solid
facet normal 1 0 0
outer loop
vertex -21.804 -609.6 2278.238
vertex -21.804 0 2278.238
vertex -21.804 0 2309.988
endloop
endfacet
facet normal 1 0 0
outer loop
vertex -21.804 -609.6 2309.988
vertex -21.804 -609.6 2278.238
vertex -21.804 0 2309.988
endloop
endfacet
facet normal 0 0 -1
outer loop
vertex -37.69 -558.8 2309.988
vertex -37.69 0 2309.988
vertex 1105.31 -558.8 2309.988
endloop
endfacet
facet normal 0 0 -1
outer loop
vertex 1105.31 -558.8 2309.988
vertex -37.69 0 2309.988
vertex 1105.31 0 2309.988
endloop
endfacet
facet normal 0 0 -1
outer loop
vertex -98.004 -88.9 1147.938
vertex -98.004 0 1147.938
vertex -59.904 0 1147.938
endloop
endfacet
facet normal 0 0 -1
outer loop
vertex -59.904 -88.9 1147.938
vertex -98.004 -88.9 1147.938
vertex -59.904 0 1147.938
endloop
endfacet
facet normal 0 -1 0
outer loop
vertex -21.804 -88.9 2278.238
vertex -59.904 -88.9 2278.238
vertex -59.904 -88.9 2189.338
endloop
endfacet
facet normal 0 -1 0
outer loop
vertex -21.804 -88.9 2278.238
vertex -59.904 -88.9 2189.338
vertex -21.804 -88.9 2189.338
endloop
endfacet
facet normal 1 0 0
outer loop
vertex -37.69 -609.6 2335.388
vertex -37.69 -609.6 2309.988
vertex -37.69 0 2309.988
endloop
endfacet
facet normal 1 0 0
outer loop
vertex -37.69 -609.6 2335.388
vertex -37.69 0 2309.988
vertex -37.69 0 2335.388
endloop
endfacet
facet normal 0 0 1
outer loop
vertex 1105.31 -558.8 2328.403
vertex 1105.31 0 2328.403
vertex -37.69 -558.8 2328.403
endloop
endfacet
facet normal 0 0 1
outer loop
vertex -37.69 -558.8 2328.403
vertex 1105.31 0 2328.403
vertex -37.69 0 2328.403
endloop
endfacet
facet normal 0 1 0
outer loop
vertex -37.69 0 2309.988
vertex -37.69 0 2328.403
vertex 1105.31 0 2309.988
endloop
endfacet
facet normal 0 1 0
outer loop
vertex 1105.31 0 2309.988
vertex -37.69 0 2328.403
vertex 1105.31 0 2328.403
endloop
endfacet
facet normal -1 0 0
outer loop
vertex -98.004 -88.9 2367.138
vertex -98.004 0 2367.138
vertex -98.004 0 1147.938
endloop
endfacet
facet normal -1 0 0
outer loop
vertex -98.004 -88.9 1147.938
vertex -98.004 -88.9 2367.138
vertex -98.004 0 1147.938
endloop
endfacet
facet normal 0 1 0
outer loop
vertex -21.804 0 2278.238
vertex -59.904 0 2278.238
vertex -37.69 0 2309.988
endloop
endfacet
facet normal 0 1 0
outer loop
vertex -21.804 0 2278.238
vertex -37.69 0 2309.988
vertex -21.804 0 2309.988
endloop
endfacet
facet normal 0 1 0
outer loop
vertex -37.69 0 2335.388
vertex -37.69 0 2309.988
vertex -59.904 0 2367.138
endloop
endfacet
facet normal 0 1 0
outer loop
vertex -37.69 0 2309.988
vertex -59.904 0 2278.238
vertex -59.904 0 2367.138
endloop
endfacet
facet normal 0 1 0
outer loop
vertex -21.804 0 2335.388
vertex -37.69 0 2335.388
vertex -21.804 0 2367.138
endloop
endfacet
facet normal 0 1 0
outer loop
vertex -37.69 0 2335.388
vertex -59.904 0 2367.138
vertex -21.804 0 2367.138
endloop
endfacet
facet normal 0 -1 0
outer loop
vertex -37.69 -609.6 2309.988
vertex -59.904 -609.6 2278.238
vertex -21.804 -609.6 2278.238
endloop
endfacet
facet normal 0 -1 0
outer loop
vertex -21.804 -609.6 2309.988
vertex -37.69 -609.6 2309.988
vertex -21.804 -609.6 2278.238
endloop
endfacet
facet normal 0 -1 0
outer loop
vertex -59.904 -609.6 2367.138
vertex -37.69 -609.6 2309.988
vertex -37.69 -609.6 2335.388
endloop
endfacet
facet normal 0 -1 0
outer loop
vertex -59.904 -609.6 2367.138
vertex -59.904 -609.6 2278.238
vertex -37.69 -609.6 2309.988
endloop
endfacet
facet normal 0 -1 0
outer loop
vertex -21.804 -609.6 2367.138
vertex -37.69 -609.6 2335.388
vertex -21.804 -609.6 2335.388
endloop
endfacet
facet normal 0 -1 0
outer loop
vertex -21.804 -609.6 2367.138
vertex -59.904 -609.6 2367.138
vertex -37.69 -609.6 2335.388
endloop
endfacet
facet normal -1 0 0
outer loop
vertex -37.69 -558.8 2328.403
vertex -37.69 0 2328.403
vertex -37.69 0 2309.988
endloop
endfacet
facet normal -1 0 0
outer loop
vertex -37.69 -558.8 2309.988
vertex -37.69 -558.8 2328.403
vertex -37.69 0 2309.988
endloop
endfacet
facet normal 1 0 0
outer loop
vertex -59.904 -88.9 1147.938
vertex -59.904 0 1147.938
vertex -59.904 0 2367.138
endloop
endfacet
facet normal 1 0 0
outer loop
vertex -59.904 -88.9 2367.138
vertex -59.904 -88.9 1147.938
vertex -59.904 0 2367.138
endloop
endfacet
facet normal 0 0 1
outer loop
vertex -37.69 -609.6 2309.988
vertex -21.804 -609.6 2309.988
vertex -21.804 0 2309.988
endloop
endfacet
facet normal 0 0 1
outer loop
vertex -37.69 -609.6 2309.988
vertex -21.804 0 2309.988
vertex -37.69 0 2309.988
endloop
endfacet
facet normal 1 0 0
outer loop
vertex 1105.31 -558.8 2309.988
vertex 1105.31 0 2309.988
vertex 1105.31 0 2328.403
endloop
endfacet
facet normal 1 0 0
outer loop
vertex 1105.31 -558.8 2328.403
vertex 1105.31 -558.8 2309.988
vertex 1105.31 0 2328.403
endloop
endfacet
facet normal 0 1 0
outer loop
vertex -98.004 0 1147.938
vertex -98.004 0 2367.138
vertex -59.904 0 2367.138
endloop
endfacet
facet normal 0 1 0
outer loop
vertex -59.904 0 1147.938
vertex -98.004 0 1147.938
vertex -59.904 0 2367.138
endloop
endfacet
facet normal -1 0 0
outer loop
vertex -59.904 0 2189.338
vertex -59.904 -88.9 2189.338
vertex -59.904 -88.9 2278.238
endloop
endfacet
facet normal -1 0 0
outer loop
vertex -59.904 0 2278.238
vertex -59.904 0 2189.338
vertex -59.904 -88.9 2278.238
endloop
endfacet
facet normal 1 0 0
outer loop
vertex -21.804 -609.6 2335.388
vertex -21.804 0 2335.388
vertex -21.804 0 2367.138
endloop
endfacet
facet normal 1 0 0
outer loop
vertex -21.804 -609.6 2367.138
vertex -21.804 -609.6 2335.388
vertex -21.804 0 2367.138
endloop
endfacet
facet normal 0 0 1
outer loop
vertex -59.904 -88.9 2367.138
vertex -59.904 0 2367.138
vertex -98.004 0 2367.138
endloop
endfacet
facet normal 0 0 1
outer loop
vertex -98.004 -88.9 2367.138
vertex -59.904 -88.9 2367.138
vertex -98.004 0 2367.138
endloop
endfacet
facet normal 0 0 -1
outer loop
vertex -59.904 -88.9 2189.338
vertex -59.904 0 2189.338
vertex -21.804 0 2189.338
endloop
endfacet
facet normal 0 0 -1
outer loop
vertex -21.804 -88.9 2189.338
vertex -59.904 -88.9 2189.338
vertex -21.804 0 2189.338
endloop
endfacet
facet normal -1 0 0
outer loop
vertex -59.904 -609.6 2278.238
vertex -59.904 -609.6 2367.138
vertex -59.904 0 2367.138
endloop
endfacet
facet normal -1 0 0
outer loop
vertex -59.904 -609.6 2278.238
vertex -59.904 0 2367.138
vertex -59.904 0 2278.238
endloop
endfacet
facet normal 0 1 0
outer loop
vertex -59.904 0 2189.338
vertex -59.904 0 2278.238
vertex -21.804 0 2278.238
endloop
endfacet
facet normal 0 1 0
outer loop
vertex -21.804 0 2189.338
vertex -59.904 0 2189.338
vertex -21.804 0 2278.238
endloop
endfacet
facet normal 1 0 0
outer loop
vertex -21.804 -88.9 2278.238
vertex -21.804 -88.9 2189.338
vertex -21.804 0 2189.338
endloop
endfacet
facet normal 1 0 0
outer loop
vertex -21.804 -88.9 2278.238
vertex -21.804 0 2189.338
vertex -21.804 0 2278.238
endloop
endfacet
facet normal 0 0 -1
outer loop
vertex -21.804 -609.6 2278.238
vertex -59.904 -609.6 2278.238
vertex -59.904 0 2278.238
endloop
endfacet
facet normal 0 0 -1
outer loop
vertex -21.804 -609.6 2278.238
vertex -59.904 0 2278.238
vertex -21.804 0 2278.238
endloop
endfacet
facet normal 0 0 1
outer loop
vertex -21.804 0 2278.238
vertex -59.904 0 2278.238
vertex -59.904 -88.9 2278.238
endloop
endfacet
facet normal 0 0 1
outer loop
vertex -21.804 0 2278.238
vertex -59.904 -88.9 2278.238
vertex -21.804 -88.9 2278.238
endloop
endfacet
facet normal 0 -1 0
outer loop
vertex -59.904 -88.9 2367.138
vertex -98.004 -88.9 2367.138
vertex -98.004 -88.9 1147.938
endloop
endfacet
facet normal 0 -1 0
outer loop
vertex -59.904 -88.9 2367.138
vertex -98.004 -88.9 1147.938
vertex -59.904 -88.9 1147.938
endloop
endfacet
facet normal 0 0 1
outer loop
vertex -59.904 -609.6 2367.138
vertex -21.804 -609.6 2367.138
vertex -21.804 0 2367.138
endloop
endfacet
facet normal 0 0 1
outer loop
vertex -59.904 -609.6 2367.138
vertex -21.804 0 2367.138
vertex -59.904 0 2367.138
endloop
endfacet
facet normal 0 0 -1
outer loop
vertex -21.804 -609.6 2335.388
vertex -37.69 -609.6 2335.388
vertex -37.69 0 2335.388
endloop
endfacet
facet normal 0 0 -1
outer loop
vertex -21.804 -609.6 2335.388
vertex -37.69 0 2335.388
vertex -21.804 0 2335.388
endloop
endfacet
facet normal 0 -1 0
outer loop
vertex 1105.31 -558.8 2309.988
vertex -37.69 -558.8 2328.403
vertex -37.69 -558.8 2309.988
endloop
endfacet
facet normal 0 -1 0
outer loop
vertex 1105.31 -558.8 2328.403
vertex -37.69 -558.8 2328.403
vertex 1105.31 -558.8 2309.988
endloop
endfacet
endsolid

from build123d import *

# Parameters (mm, degrees)
F1_DEPTH = 609.6
F2_DEPTH = 88.9
F0_W     = 38.1
F0_H     = 88.9
F3_DEPTH = 88.9
F4_DEPTH = 558.8


with BuildPart() as f1:
    # F0 (on Front) → F1 (new body)
    with BuildSketch(Plane.XZ):
        Polygon((-21.804077, 2367.138244), (-59.904077, 2367.138244), (-59.904077, 2278.238244), (-21.804077, 2278.238244), (-21.804077, 2309.988244), (-37.690178, 2309.988244), (-37.690178, 2328.403244), (-37.690178, 2335.388244), (-21.804077, 2335.388244), (-21.804077, 2348.088244), align=None)
    extrude(amount=F1_DEPTH)


with BuildPart() as f2:
    # F0 (on Front) → F2 (new body)
    with BuildSketch(Plane.XZ):
        Polygon((-59.904077, 2367.138244), (-98.004077, 2367.138244), (-98.004077, 1147.938244), (-59.904077, 1147.938244), (-59.904077, 2189.338244), (-59.904077, 2278.238244), align=None)
    extrude(amount=F2_DEPTH)


with BuildPart() as f3:
    # F0 (on Front) → F3 (new body)
    with BuildSketch(Plane.XZ):
        with Locations((-40.854077, 2233.788244)):
            Rectangle(F0_W, F0_H)
    extrude(amount=F3_DEPTH)


with BuildPart() as f4:
    # F0 (on Front) → F4 (new body)
    with BuildSketch(Plane.XZ):
        Polygon((-21.804077, 2322.688244), (-21.804077, 2309.988244), (1105.309822, 2309.988244), (1105.309822, 2328.403244), (-21.804077, 2328.403244), align=None)
        Polygon((-37.690178, 2309.988244), (-21.804077, 2309.988244), (-21.804077, 2322.688244), (-21.804077, 2328.403244), (-37.690178, 2328.403244), align=None)
    extrude(amount=F4_DEPTH)


solid = Compound([f1.part, f2.part, f3.part, f4.part])
